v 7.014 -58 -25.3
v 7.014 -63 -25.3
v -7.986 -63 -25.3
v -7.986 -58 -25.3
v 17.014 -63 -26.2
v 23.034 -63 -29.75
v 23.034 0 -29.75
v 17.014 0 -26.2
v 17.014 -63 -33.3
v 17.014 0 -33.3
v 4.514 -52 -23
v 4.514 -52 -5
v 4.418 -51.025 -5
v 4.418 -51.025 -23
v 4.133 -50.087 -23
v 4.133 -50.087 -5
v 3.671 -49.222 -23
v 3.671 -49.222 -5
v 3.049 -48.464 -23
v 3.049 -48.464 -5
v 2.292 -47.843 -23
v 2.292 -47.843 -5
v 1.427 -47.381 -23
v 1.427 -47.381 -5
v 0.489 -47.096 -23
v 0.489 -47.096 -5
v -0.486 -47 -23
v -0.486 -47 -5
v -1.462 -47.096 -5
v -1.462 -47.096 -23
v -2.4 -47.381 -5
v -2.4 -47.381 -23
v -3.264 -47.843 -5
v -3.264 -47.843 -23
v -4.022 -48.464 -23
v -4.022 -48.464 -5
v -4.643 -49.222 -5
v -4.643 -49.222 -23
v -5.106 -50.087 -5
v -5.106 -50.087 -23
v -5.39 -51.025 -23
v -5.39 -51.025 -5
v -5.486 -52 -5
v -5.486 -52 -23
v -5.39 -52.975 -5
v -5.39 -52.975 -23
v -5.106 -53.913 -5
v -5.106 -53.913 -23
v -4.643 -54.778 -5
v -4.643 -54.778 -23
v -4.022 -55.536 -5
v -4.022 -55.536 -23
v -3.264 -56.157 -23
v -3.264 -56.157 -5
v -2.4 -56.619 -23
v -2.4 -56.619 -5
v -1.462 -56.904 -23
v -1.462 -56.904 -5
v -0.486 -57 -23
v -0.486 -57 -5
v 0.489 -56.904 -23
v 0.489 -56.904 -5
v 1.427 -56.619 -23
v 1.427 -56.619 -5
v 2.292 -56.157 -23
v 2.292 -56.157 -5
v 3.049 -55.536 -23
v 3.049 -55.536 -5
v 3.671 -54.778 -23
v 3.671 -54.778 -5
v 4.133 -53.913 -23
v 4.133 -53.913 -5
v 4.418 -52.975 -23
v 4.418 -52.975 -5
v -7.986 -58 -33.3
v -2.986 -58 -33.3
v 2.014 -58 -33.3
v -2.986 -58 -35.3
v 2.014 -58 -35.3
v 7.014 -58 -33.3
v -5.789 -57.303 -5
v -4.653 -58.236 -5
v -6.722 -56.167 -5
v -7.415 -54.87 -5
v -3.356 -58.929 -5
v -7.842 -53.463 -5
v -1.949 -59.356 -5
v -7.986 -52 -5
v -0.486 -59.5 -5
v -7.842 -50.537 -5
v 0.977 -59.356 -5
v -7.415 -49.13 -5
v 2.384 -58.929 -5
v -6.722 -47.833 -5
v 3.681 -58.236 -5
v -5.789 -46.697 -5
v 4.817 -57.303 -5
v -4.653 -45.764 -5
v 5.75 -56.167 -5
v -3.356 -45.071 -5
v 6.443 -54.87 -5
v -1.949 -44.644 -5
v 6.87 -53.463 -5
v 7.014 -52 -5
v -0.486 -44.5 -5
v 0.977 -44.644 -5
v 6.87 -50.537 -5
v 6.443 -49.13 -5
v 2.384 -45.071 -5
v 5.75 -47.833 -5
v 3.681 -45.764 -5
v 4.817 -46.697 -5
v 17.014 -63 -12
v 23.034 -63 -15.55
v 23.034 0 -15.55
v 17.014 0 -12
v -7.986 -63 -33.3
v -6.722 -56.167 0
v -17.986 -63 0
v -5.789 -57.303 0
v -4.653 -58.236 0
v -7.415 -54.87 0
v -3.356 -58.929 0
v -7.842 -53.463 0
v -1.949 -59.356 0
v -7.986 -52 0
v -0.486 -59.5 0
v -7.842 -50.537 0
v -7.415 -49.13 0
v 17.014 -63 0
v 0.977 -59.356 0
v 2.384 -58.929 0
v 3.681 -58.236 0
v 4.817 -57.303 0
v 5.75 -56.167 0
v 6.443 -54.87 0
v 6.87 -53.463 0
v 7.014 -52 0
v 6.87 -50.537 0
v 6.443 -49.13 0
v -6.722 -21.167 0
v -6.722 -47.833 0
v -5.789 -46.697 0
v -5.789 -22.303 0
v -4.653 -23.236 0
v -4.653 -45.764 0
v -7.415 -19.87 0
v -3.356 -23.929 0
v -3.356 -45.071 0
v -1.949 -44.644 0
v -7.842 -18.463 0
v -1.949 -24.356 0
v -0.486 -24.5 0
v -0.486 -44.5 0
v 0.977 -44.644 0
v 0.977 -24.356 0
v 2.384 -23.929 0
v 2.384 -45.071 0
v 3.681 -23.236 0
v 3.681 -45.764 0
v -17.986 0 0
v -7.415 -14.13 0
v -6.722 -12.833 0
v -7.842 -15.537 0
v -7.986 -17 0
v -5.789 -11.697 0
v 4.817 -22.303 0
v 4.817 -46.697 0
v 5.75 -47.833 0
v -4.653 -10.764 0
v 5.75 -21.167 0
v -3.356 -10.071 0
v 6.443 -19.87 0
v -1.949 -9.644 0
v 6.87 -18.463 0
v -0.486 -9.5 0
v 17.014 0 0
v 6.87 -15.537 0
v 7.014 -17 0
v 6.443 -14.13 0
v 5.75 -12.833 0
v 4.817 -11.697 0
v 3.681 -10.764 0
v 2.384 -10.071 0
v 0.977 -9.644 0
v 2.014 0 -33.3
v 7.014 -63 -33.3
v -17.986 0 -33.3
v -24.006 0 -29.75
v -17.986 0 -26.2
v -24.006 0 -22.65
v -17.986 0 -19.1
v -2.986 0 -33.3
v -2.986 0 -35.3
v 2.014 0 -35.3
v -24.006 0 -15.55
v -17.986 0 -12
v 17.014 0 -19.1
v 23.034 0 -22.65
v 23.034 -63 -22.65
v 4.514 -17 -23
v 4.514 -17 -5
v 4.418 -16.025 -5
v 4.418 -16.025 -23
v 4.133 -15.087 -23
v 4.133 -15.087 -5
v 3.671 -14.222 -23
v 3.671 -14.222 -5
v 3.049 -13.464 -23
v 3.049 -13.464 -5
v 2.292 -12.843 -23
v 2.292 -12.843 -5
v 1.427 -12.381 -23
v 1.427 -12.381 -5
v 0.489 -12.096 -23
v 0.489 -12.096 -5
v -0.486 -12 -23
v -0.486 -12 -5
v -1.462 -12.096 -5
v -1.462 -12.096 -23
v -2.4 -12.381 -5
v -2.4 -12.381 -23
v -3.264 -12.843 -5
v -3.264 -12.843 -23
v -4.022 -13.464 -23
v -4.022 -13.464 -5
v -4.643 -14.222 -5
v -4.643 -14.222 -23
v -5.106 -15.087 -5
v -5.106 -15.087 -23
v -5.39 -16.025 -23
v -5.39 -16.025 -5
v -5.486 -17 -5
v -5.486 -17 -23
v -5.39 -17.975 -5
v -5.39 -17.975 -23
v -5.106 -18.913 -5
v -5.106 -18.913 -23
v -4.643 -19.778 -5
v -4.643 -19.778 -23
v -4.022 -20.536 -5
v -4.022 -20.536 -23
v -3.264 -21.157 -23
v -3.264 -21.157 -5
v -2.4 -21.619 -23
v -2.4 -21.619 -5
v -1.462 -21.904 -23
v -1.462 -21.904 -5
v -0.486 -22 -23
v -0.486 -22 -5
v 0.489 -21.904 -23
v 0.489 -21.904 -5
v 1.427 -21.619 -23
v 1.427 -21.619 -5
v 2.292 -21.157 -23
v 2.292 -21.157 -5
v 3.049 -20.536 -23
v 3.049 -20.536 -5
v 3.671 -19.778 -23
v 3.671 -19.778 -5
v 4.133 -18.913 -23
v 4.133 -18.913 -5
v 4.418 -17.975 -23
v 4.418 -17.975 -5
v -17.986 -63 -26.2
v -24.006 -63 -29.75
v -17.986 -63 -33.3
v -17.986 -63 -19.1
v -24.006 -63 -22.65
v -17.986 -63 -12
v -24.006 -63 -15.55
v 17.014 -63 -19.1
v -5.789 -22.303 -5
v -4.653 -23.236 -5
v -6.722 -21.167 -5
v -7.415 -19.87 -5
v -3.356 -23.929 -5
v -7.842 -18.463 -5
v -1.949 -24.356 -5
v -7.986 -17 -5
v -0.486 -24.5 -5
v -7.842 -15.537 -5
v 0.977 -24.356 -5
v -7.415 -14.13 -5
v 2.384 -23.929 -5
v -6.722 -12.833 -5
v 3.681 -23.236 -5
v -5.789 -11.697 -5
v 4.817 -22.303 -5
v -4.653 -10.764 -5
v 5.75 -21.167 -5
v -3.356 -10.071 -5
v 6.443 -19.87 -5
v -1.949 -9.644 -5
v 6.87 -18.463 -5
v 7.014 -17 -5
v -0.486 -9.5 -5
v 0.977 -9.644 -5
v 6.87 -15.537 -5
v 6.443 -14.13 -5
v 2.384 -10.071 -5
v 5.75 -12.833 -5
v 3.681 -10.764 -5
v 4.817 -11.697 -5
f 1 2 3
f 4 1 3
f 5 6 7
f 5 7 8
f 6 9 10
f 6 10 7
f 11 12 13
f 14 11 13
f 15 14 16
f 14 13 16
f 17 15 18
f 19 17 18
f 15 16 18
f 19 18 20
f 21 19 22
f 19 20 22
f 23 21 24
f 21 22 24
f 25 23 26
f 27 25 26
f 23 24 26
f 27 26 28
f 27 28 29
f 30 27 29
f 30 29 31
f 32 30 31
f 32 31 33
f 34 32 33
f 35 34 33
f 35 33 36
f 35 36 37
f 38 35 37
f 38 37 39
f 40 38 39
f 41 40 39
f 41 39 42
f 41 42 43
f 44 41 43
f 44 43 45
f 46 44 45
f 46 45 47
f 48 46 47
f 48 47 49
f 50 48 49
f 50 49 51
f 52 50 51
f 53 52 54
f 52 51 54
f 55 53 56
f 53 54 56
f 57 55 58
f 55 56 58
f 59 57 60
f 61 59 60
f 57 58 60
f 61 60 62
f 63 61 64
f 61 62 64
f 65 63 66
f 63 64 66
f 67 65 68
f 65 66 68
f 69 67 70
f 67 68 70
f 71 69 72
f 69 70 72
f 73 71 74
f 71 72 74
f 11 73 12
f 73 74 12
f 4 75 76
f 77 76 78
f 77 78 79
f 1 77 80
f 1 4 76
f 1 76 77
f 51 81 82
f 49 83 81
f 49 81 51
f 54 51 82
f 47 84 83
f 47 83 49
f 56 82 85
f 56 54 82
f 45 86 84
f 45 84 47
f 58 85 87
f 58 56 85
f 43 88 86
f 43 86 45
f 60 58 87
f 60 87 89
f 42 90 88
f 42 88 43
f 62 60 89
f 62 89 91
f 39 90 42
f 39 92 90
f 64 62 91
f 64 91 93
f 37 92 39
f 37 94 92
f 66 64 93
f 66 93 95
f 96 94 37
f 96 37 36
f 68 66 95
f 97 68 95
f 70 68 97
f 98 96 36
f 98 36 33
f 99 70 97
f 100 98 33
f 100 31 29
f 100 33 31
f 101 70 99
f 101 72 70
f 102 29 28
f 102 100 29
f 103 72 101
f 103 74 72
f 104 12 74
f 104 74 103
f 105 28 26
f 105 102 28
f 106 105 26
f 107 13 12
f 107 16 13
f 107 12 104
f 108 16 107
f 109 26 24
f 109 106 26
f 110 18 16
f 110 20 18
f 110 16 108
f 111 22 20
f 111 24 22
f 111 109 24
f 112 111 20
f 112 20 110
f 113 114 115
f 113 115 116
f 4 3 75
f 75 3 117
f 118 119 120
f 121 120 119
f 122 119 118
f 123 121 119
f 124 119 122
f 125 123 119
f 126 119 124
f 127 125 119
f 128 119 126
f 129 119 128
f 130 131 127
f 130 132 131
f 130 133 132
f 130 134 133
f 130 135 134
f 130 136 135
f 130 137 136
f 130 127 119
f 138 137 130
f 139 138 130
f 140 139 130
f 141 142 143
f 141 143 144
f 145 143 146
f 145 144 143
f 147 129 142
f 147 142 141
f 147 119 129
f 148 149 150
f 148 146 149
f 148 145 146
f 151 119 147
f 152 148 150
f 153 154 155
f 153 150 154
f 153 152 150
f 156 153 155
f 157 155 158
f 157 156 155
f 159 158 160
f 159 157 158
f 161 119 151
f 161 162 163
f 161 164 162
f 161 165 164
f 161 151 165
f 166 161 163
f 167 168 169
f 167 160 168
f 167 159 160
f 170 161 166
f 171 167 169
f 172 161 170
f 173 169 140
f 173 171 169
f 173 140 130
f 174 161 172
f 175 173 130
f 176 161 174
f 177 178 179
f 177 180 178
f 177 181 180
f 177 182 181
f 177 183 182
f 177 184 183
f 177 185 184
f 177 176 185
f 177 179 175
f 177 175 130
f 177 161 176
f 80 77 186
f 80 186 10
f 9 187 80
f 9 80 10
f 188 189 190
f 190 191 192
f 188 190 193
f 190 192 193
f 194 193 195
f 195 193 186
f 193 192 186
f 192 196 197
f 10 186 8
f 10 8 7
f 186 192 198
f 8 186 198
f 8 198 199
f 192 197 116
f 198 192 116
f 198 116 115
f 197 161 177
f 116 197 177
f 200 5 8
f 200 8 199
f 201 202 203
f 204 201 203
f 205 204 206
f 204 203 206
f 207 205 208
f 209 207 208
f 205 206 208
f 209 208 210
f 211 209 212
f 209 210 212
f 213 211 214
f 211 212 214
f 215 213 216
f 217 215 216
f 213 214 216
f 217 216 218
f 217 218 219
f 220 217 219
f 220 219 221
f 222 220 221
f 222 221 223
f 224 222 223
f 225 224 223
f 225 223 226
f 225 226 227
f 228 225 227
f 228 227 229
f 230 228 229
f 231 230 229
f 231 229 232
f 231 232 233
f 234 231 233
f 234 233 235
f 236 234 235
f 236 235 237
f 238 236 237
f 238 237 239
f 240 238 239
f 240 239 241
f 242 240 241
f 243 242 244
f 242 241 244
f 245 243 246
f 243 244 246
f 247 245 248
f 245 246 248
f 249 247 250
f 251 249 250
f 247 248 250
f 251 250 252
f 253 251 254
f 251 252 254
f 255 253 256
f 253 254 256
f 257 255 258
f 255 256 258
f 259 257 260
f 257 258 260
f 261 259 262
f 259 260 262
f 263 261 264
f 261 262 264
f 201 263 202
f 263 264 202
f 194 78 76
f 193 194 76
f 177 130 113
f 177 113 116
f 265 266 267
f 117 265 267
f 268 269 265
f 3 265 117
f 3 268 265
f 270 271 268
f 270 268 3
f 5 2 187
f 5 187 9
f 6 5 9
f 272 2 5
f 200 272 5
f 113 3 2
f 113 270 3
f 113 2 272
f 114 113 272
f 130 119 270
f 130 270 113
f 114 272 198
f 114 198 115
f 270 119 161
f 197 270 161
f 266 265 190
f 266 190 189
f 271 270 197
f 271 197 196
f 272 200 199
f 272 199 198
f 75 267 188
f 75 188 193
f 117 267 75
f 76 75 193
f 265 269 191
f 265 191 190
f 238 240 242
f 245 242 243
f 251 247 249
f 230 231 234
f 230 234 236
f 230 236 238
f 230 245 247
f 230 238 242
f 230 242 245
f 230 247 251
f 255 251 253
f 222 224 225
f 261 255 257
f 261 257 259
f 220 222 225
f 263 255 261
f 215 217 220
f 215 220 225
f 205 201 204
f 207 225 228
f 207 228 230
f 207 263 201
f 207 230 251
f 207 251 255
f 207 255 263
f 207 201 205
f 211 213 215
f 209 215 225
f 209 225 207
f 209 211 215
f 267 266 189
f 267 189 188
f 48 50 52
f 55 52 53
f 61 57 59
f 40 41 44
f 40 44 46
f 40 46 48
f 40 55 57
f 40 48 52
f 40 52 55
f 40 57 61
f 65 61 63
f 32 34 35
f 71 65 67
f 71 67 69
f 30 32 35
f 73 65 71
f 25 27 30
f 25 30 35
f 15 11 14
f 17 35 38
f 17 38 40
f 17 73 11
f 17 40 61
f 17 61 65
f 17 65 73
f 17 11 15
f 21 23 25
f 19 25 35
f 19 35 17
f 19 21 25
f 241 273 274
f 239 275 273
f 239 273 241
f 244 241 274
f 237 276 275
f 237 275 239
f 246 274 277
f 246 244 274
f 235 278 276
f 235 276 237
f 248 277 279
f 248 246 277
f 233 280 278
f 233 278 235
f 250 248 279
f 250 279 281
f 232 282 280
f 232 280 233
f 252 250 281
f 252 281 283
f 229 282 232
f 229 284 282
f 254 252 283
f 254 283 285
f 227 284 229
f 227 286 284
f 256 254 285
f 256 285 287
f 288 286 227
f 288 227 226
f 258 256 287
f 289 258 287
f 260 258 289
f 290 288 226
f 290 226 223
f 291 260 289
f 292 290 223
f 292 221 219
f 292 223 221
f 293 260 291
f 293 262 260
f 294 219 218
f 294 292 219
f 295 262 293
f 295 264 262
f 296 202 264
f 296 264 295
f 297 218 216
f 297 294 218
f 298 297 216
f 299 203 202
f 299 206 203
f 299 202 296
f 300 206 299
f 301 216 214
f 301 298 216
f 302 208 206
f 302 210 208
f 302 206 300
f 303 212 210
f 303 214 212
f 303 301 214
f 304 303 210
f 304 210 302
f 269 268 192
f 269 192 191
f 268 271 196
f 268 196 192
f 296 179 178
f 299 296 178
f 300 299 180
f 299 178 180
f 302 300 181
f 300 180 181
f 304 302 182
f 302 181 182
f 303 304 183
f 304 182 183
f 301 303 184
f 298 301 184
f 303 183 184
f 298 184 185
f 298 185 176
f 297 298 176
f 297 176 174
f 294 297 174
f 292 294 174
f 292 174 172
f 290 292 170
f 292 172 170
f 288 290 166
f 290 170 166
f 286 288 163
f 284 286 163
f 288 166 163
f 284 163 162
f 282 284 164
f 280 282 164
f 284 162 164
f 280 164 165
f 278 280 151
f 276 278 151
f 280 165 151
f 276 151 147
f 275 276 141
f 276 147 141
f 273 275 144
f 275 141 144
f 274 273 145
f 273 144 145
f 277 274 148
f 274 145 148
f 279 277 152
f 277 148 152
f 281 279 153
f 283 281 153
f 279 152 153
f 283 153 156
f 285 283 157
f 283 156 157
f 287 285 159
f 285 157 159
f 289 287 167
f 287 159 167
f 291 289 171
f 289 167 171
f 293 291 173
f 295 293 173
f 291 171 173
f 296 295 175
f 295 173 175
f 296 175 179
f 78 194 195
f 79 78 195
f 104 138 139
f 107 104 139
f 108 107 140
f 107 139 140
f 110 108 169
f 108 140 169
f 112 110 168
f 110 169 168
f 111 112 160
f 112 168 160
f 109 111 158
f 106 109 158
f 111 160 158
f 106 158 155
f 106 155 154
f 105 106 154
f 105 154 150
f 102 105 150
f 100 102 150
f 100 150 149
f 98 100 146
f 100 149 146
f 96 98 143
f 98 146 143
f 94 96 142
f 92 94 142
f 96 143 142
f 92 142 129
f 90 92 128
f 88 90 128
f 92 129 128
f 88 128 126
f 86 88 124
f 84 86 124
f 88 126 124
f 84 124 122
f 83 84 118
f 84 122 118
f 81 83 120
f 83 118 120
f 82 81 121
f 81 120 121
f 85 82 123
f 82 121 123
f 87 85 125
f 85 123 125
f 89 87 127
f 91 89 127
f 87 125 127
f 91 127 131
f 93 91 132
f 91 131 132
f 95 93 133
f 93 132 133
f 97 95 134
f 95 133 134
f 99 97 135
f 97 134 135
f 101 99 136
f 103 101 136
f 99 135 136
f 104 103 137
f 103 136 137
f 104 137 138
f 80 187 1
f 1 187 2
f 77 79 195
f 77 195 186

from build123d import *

# Parameters (mm, degrees)
F0_W     = 35
F0_H     = 63
F1_DEPTH = 35.3
F2_W     = 15
F2_H     = 2
F3_DEPTH = 63.001
F4_DEPTH = 63
F5_R     = 5
F6_DEPTH = 23
F5_R_2   = 7.5
F7_DEPTH = 5
F9_DEPTH = 5


with BuildPart() as f1:
    # F0 (on Top) → F1 (new body)
    with BuildSketch(Plane.XY):
        with Locations((-0.486111, -31.5)):
            Rectangle(F0_W, F0_H)
    extrude(amount=-F1_DEPTH)

    # F2 (on face) → F3 (cut, through all)
    with BuildSketch(Plane.XZ.offset(63)):
        with Locations((9.513889, -34.3)):
            Rectangle(F2_W, F2_H)
        with Locations((-10.486111, -34.3)):
            Rectangle(F2_W, F2_H)
    extrude(amount=-F3_DEPTH, mode=Mode.SUBTRACT)

    # F2 (on face) → F4 (join)
    with BuildSketch(Plane.XZ.offset(63)):
        Polygon((-17.986111, -19.1), (-17.986111, -12), (-24.006156, -15.55), align=None)
        Polygon((-17.986111, -26.2), (-17.986111, -19.1), (-24.006156, -22.65), align=None)
        Polygon((-17.986111, -33.3), (-17.986111, -26.2), (-24.006156, -29.75), align=None)
        Polygon((23.033934, -29.75), (17.013889, -26.2), (17.013889, -33.3), align=None)
        Polygon((23.033934, -15.55), (17.013889, -12), (17.013889, -19.1), align=None)
        Polygon((23.033934, -22.65), (17.013889, -19.1), (17.013889, -26.2), align=None)
    extrude(amount=-F4_DEPTH)

    # F5 (on face) → F6 (cut)
    with BuildSketch(Plane.XY):
        with Locations((-0.486111, -17)):
            Circle(F5_R)
        with Locations((-0.486111, -52)):
            Circle(F5_R)
    extrude(amount=-F6_DEPTH, mode=Mode.SUBTRACT)

    # F5 (on face) → F7 (cut)
    with BuildSketch(Plane.XY):
        with Locations((-0.486111, -17)):
            Circle(F5_R_2)
        with Locations((-0.486111, -17)):
            Circle(F5_R, mode=Mode.SUBTRACT)
        with Locations((-0.486111, -52)):
            Circle(F5_R_2)
        with Locations((-0.486111, -52)):
            Circle(F5_R, mode=Mode.SUBTRACT)
    extrude(amount=-F7_DEPTH, mode=Mode.SUBTRACT)

    # F8 (on face) → F9 (cut)
    with BuildSketch(Plane.XZ.offset(63)):
        Polygon((-0.486111, -25.3), (-7.986111, -25.3), (-7.986111, -35.504304), (7.013889, -35.504304), (7.013889, -25.3), align=None)
    extrude(amount=-F9_DEPTH, mode=Mode.SUBTRACT)


solid = f1.part
